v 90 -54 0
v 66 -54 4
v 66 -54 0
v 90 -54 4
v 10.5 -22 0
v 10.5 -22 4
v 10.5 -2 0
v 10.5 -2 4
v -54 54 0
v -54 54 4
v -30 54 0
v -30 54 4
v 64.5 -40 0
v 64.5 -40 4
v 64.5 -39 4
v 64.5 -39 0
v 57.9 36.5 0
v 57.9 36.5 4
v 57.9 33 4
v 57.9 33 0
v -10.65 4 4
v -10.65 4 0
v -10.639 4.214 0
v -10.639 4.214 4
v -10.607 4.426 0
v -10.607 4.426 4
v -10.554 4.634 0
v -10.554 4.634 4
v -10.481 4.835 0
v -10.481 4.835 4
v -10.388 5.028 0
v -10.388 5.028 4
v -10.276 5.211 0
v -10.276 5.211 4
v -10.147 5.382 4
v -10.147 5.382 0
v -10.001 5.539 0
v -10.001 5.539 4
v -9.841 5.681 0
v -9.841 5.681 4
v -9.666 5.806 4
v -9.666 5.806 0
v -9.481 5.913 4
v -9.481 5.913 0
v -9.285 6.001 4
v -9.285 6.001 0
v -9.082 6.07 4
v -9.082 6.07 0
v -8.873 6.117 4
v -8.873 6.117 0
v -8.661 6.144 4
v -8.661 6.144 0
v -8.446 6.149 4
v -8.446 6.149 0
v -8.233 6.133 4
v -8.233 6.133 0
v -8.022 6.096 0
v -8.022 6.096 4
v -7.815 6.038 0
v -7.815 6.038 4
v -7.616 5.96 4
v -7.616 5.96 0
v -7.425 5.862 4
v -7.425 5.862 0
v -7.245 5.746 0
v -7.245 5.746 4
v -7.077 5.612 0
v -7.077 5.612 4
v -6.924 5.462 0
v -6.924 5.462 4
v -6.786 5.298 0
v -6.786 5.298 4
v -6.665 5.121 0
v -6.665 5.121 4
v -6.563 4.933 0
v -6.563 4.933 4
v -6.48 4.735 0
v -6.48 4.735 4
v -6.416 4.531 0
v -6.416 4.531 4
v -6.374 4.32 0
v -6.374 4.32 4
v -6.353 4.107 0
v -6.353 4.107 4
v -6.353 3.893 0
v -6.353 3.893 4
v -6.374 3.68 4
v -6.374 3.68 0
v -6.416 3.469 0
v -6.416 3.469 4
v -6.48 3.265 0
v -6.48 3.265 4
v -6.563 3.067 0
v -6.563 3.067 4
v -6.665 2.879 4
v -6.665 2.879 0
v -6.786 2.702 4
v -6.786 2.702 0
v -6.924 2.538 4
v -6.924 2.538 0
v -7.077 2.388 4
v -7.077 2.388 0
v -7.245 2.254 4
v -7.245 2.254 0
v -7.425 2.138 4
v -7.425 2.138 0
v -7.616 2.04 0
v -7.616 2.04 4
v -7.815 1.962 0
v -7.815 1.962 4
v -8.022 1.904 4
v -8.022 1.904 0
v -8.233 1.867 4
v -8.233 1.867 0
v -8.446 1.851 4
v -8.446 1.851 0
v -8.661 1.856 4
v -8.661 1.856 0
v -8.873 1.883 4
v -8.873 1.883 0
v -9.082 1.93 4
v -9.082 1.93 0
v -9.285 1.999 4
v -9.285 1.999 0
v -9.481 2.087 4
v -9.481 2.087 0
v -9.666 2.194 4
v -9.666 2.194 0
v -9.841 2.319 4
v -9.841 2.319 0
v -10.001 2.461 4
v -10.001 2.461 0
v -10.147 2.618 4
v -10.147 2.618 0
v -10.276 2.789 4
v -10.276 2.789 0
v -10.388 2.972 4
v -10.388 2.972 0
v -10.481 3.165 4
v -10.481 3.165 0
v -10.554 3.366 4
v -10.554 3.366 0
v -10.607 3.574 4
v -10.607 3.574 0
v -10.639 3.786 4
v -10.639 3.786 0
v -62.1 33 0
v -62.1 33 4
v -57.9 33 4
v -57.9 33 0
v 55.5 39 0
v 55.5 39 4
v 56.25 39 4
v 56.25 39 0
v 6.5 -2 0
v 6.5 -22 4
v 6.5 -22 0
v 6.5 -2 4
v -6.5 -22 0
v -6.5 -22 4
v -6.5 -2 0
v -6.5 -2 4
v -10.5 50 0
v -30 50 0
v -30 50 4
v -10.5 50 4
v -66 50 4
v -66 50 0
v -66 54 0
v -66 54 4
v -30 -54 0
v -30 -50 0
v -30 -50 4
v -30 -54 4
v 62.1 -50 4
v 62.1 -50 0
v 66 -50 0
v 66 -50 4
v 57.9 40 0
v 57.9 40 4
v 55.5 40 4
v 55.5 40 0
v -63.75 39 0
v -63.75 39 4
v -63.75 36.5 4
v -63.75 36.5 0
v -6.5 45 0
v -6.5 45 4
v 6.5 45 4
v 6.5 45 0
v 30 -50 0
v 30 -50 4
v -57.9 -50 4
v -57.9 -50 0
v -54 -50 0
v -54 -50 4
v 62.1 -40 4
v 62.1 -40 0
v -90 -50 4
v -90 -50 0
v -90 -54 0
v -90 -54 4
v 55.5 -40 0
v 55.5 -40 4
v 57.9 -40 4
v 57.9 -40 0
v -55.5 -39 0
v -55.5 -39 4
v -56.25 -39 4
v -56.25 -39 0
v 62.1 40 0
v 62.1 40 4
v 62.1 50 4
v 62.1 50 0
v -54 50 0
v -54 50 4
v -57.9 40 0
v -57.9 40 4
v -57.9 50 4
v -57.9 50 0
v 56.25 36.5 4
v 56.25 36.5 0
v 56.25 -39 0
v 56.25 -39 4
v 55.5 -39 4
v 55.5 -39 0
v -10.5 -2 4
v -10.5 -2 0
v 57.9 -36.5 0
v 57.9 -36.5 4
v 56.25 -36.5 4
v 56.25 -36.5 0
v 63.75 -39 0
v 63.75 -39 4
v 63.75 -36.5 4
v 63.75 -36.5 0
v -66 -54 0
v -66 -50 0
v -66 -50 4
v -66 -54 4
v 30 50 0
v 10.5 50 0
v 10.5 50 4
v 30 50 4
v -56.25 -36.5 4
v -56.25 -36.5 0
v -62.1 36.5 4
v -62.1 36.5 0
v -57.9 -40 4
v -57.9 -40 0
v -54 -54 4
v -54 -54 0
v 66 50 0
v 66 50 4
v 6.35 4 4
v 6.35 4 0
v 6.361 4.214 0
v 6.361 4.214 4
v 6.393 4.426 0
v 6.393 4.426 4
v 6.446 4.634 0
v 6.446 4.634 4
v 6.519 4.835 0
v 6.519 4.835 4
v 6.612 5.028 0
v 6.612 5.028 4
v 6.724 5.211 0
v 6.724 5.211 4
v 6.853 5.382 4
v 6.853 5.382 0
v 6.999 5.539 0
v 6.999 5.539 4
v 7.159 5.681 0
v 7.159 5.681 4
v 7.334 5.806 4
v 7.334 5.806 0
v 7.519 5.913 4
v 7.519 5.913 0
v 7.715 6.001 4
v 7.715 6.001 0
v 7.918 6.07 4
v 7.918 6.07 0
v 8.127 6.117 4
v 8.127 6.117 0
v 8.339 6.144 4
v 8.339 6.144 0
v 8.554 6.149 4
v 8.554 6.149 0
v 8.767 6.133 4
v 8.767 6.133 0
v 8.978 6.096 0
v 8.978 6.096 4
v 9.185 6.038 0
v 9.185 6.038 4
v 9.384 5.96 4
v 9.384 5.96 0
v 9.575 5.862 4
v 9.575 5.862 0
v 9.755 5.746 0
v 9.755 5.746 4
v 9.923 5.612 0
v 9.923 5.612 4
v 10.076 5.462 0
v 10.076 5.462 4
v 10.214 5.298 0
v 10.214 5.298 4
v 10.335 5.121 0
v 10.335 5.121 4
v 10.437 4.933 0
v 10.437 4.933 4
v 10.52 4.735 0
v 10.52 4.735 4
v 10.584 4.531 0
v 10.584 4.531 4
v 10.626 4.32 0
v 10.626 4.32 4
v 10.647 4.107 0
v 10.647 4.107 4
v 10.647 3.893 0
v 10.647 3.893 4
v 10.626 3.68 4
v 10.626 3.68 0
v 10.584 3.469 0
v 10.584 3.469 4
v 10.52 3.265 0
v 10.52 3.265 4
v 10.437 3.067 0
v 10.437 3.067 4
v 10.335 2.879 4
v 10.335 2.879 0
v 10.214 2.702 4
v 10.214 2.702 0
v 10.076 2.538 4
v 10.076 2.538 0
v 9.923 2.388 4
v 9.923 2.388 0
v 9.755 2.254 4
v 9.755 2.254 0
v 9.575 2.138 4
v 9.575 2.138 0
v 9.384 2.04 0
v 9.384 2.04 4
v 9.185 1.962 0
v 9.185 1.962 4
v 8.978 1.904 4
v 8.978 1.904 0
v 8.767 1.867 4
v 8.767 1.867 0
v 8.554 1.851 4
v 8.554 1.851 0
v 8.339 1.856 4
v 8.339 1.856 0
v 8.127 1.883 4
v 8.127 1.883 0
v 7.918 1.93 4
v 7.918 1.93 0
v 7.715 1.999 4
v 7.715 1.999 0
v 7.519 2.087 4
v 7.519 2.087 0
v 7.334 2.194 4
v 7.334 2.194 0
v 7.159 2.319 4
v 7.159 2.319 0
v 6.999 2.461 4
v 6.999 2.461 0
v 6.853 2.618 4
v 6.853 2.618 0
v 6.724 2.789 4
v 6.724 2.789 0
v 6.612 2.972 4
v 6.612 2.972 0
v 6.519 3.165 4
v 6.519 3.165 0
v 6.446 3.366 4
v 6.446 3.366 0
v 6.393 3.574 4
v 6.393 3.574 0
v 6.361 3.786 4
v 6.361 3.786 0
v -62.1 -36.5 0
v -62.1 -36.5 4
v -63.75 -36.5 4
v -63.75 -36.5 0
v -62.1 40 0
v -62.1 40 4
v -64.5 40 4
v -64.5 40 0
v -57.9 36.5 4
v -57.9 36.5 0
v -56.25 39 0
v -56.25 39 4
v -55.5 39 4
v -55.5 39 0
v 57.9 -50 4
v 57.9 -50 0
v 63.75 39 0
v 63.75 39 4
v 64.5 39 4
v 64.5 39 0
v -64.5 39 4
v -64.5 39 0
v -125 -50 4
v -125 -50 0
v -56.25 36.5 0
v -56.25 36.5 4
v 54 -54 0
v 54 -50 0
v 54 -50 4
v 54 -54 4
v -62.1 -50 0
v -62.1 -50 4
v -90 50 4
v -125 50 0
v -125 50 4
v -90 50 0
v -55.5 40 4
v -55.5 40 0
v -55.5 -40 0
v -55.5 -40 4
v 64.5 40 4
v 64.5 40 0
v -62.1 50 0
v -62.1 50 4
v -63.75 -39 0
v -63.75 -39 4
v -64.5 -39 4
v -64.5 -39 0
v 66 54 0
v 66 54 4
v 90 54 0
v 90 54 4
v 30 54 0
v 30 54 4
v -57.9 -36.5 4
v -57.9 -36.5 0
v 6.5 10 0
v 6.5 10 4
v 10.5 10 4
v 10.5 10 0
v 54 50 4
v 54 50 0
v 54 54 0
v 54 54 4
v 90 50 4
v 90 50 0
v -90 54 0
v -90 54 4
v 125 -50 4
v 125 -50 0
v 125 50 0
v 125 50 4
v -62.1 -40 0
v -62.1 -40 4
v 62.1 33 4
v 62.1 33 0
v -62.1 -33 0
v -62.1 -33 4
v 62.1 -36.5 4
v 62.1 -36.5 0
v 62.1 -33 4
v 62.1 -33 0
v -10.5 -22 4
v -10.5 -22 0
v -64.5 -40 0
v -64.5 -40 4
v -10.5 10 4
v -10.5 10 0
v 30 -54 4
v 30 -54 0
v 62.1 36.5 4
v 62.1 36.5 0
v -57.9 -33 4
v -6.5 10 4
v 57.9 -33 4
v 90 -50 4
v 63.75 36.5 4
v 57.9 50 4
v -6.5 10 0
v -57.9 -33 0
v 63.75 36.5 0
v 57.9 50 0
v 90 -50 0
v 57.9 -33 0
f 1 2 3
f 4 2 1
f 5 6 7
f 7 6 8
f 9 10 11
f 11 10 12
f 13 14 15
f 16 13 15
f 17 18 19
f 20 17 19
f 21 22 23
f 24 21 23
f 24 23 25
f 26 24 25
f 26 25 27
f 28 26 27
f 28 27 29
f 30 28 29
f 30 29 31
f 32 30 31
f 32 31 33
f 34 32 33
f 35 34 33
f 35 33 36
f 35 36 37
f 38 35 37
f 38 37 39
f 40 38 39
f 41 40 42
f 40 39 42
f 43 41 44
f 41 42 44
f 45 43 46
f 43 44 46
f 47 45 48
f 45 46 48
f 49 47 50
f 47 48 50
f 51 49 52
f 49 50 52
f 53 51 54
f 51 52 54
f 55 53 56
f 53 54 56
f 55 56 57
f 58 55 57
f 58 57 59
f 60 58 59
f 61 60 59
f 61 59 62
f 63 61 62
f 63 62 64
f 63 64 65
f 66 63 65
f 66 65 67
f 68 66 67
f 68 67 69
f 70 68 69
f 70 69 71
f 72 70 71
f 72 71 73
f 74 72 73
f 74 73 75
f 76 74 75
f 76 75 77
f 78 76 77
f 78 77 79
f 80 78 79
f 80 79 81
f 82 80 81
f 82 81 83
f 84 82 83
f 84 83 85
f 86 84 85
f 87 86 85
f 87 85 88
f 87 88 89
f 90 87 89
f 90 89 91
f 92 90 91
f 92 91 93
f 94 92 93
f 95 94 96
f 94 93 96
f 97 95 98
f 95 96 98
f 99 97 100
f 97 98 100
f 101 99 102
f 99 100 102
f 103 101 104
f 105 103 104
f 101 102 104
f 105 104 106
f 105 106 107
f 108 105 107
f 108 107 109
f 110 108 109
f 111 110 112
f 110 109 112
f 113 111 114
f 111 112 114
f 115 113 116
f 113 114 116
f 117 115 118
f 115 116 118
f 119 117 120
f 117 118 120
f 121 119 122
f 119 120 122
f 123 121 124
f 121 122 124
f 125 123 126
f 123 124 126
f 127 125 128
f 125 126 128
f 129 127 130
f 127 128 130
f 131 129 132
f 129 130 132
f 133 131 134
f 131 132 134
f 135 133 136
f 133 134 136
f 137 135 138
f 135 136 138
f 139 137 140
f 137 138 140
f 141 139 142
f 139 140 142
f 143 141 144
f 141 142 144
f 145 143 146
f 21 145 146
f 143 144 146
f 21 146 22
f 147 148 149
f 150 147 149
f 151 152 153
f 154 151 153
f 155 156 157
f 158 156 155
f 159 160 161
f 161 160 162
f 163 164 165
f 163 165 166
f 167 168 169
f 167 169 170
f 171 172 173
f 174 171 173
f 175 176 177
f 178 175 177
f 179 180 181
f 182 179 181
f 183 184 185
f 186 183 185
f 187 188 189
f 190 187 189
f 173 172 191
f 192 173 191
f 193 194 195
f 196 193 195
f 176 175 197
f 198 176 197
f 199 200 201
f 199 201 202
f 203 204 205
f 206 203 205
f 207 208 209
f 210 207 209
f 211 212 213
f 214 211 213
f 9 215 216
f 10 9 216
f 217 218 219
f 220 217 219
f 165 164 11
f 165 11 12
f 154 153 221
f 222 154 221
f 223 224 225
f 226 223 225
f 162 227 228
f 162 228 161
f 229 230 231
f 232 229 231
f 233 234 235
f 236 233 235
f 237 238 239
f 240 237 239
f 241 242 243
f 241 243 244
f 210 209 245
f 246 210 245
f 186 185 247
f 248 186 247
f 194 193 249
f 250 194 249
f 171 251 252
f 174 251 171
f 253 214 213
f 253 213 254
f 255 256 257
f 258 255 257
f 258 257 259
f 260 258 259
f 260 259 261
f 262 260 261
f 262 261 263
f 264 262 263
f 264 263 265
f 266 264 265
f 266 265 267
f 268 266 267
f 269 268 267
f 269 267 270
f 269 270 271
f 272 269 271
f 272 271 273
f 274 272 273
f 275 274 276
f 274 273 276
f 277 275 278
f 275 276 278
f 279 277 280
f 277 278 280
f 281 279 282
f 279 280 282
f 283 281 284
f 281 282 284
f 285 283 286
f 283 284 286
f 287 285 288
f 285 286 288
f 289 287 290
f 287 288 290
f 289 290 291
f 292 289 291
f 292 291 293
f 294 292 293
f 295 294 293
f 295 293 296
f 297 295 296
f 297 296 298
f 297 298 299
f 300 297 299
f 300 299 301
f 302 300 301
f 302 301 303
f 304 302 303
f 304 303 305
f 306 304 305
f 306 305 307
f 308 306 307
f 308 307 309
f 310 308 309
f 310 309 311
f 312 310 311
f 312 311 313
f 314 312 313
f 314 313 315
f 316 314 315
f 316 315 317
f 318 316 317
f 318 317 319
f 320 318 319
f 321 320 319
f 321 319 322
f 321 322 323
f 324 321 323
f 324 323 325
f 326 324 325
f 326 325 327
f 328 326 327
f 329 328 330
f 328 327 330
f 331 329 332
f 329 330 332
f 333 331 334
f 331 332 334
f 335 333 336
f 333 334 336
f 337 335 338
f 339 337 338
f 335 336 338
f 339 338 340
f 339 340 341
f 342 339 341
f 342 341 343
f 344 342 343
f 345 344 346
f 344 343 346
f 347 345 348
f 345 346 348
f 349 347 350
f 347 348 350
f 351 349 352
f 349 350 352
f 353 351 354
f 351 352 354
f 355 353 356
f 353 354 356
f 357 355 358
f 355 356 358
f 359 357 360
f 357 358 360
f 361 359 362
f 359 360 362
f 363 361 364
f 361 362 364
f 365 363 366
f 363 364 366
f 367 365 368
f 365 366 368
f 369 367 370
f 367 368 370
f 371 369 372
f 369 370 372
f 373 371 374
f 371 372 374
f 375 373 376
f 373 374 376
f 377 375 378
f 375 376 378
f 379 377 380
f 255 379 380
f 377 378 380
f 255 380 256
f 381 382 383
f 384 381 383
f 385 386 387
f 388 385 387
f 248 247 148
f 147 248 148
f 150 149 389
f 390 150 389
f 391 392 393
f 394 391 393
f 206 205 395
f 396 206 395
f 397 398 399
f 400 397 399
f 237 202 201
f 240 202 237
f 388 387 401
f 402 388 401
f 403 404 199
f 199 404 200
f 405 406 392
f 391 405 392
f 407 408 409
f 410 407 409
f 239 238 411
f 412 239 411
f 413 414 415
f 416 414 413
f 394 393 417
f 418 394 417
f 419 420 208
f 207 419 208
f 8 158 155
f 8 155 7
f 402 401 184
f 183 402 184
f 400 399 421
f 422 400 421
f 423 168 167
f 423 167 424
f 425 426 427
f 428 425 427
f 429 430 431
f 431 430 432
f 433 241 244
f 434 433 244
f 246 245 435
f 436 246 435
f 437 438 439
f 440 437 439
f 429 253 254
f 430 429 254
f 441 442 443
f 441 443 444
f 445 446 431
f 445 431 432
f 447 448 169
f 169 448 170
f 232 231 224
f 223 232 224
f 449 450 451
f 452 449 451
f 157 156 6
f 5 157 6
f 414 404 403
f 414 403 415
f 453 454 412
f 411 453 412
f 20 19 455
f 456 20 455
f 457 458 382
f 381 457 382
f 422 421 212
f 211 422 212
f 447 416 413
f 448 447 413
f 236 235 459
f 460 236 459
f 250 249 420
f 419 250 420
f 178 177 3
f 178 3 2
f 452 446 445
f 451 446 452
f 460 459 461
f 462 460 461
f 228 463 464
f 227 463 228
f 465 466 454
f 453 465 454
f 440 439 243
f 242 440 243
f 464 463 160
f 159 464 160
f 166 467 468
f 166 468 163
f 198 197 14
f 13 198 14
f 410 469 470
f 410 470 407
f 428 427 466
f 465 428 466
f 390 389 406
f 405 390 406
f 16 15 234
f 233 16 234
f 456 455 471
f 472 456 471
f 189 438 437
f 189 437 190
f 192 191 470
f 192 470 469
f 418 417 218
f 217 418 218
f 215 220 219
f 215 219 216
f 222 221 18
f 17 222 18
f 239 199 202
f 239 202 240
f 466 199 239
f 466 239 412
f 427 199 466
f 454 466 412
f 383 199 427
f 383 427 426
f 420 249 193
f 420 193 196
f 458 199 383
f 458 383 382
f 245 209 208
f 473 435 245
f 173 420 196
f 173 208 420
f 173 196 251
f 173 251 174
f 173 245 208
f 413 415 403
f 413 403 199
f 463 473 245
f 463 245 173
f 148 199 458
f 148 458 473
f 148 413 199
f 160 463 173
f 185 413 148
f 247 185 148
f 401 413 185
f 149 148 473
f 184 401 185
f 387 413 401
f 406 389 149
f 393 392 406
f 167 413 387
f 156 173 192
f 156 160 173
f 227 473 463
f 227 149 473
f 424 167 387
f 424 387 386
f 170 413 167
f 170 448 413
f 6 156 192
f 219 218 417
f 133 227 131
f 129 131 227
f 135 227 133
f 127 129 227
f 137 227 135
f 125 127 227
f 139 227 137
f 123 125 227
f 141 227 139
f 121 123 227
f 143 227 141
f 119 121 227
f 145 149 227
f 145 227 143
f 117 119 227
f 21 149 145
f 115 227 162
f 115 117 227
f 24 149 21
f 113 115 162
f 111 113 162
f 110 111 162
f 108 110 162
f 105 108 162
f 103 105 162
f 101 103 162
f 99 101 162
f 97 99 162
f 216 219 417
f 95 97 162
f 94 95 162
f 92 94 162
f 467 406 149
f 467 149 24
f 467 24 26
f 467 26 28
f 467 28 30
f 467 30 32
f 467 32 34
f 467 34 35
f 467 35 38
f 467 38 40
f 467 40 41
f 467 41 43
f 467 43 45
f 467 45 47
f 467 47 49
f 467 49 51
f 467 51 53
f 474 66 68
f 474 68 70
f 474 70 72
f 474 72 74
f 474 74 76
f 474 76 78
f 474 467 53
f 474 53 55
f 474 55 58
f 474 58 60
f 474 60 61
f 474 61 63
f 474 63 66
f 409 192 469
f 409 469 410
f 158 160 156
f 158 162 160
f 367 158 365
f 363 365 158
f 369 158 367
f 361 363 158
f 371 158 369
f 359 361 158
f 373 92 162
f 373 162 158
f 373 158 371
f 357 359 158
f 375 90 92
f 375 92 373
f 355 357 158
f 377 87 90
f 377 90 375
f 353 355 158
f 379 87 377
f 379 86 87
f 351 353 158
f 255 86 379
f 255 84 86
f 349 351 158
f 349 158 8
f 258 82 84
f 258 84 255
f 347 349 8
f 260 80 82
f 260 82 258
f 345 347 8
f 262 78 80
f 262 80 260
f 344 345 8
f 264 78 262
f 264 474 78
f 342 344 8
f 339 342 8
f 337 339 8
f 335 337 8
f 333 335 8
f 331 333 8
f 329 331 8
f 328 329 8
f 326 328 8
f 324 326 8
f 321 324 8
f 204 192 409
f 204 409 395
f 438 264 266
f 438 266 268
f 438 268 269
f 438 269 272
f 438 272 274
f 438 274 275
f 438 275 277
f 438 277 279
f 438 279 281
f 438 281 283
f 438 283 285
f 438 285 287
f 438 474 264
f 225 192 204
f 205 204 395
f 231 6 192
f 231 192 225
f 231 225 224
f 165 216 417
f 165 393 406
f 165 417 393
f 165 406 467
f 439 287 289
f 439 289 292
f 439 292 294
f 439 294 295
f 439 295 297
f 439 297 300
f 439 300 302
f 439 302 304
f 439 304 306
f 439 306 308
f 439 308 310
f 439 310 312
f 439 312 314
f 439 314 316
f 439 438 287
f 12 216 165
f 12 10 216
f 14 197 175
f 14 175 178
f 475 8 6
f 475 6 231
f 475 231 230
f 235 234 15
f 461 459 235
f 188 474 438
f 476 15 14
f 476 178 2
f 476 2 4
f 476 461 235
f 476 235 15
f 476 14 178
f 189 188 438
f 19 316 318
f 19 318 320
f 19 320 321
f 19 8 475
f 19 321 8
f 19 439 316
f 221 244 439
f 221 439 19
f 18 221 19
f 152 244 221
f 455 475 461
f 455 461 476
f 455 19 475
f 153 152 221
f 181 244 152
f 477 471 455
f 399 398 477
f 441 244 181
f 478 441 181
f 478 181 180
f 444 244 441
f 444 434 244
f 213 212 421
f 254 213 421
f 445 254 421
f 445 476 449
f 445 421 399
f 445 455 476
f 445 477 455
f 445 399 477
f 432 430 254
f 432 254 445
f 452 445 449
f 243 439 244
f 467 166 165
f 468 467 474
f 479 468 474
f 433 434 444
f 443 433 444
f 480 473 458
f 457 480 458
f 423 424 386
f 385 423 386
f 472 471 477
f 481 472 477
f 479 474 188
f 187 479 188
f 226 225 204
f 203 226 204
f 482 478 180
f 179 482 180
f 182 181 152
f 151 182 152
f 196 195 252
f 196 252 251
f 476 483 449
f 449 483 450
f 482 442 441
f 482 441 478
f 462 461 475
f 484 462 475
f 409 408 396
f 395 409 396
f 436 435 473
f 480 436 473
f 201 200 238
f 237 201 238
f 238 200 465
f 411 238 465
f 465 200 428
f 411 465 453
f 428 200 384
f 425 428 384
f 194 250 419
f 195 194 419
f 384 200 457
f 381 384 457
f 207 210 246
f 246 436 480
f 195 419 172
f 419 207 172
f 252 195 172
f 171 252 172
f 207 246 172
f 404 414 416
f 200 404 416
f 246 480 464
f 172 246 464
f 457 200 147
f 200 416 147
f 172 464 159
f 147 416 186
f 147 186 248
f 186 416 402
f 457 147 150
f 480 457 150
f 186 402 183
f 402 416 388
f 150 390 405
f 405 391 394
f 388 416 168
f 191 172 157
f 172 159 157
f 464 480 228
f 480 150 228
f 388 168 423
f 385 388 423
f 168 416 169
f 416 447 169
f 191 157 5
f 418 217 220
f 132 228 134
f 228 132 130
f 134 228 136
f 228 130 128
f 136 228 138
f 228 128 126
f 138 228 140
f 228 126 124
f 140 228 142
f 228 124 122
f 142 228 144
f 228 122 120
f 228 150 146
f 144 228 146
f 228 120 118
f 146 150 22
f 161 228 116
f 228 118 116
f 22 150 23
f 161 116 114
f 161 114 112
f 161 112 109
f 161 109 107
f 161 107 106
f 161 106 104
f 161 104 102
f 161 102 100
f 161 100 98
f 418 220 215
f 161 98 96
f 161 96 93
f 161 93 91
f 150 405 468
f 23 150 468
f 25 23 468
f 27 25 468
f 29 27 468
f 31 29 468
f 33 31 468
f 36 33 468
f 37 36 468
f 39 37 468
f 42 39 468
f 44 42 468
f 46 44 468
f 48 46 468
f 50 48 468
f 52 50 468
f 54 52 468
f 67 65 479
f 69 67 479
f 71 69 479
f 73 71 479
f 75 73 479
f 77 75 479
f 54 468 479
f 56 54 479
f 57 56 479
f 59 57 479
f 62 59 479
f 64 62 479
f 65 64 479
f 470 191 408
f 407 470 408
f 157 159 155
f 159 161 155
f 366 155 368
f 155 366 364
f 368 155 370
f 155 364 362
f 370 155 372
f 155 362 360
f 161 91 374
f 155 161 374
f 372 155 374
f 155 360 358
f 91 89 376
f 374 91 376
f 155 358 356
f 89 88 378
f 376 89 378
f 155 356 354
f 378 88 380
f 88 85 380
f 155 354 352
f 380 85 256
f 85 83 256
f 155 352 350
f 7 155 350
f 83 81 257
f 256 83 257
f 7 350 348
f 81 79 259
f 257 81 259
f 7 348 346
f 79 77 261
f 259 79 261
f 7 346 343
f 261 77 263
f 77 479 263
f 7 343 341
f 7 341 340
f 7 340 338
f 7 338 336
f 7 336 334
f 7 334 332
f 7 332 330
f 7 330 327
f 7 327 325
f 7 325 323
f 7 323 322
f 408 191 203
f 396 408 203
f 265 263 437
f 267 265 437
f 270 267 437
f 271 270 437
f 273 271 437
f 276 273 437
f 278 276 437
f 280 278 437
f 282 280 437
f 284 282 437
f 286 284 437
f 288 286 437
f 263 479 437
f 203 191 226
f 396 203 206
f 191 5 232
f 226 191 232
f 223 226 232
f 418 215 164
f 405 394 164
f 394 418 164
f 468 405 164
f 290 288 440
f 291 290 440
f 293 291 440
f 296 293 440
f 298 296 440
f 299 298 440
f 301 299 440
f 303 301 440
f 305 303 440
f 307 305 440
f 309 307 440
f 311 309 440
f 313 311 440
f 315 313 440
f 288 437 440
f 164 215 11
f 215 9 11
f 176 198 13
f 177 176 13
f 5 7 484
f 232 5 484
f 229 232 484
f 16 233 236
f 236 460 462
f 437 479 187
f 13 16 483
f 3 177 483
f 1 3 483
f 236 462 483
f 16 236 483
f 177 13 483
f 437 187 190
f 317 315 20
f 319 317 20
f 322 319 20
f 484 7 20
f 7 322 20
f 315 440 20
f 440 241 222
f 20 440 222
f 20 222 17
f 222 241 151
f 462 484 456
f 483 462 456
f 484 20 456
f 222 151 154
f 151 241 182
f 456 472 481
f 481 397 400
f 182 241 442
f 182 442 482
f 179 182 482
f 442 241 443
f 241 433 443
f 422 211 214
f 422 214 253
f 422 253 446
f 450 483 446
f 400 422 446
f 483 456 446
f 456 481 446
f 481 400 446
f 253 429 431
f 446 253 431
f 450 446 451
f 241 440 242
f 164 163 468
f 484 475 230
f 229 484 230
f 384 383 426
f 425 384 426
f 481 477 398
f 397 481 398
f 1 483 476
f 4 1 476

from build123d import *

# Parameters (mm, degrees)
SKETCH1_W                = 250
SKETCH1_H                = 100
BOSS_EXTRUDE1_DEPTH      = 4
SKETCH2_W                = 24
SKETCH2_H                = 4
BOSS_EXTRUDE2_DEPTH      = 4
SKETCH3_W                = 4
SKETCH3_H                = 40
SKETCH3_H_2              = 20
CUT_EXTRUDE1_DEPTH       = 5
M4_CLEARANCE_HOLE1_D     = 4.3
M4_CLEARANCE_HOLE1_DEPTH = 6
M4_CLEARANCE_HOLE1_TIP   = 1.291850331
CUT_EXTRUDE2_DEPTH       = 10
SKETCH7_W                = 13
SKETCH7_H                = 5
CUT_EXTRUDE3_DEPTH       = 10


with BuildPart() as part:
    # Sketch1 → Boss-Extrude1 (new body)
    with BuildSketch(Plane.XY):
        Rectangle(SKETCH1_W, SKETCH1_H)
    extrude(amount=BOSS_EXTRUDE1_DEPTH)

    # Sketch2 → Boss-Extrude2 (add)
    with BuildSketch(Plane.XZ.offset(50)):
        with Locations((-78, 2)):
            Rectangle(SKETCH2_W, SKETCH2_H)
        with Locations((-42, 2)):
            Rectangle(SKETCH2_W, SKETCH2_H)
        with Locations((42, 2)):
            Rectangle(SKETCH2_W, SKETCH2_H)
        with Locations((78, 2)):
            Rectangle(SKETCH2_W, SKETCH2_H)
    boss_extrude2 = extrude(amount=BOSS_EXTRUDE2_DEPTH)

    # Sketch3 → Cut-Extrude1 (cut, through all)
    with BuildSketch(Plane.XY.offset(4)):
        with Locations((-8.5, 30)):
            Rectangle(SKETCH3_W, SKETCH3_H)
        with Locations((-8.5, -12)):
            Rectangle(SKETCH3_W, SKETCH3_H_2)
        with Locations((8.5, -12)):
            Rectangle(SKETCH3_W, SKETCH3_H_2)
        with Locations((8.5, 30)):
            Rectangle(SKETCH3_W, SKETCH3_H)
    extrude(amount=-CUT_EXTRUDE1_DEPTH, mode=Mode.SUBTRACT)

    # Mirror1: Boss-Extrude2 across plane
    add(boss_extrude2.mirror(Plane.ZX))

    # M4 Clearance Hole1
    with Locations(Plane.XY.offset(4)):
        with Locations((-8.5, 4), (8.5, 4)):
            Hole(M4_CLEARANCE_HOLE1_D / 2, depth=M4_CLEARANCE_HOLE1_DEPTH)
            with Locations((0, 0, -(M4_CLEARANCE_HOLE1_DEPTH + M4_CLEARANCE_HOLE1_TIP / 2))):  # 118° drill point
                Cone(0, M4_CLEARANCE_HOLE1_D / 2, M4_CLEARANCE_HOLE1_TIP, mode=Mode.SUBTRACT)

    # Sketch6 → Cut-Extrude2 (cut)
    with BuildSketch(Plane.XY.offset(4)):
        Polygon((-62.1, -50), (-57.9, -50), (-57.9, -40), (-55.5, -40), (-55.5, -39), (-56.25, -39), (-56.25, -36.5), (-57.9, -36.5), (-57.9, -33), (-62.1, -33), (-62.1, -36.5), (-63.75, -36.5), (-63.75, -39), (-64.5, -39), (-64.5, -40), (-62.1, -40), align=None)
        Polygon((57.9, -40), (57.9, -50), (62.1, -50), (62.1, -40), (64.5, -40), (64.5, -39), (63.75, -39), (63.75, -36.5), (62.1, -36.5), (62.1, -33), (57.9, -33), (57.9, -36.5), (56.25, -36.5), (56.25, -39), (55.5, -39), (55.5, -40), align=None)
        Polygon((62.1, 40), (62.1, 50), (57.9, 50), (57.9, 40), (55.5, 40), (55.5, 39), (56.25, 39), (56.25, 36.5), (57.9, 36.5), (57.9, 33), (62.1, 33), (62.1, 36.5), (63.75, 36.5), (63.75, 39), (64.5, 39), (64.5, 40), align=None)
        Polygon((-57.9, 50), (-62.1, 50), (-62.1, 40), (-64.5, 40), (-64.5, 39), (-63.75, 39), (-63.75, 36.5), (-62.1, 36.5), (-62.1, 33), (-57.9, 33), (-57.9, 36.5), (-56.25, 36.5), (-56.25, 39), (-55.5, 39), (-55.5, 40), (-57.9, 40), align=None)
    extrude(amount=-CUT_EXTRUDE2_DEPTH, mode=Mode.SUBTRACT)

    # Sketch7 → Cut-Extrude3 (cut)
    with BuildSketch(Plane.XY.offset(4)):
        with Locations((0, 47.5)):
            Rectangle(SKETCH7_W, SKETCH7_H)
    extrude(amount=-CUT_EXTRUDE3_DEPTH, mode=Mode.SUBTRACT)


solid = part.part
